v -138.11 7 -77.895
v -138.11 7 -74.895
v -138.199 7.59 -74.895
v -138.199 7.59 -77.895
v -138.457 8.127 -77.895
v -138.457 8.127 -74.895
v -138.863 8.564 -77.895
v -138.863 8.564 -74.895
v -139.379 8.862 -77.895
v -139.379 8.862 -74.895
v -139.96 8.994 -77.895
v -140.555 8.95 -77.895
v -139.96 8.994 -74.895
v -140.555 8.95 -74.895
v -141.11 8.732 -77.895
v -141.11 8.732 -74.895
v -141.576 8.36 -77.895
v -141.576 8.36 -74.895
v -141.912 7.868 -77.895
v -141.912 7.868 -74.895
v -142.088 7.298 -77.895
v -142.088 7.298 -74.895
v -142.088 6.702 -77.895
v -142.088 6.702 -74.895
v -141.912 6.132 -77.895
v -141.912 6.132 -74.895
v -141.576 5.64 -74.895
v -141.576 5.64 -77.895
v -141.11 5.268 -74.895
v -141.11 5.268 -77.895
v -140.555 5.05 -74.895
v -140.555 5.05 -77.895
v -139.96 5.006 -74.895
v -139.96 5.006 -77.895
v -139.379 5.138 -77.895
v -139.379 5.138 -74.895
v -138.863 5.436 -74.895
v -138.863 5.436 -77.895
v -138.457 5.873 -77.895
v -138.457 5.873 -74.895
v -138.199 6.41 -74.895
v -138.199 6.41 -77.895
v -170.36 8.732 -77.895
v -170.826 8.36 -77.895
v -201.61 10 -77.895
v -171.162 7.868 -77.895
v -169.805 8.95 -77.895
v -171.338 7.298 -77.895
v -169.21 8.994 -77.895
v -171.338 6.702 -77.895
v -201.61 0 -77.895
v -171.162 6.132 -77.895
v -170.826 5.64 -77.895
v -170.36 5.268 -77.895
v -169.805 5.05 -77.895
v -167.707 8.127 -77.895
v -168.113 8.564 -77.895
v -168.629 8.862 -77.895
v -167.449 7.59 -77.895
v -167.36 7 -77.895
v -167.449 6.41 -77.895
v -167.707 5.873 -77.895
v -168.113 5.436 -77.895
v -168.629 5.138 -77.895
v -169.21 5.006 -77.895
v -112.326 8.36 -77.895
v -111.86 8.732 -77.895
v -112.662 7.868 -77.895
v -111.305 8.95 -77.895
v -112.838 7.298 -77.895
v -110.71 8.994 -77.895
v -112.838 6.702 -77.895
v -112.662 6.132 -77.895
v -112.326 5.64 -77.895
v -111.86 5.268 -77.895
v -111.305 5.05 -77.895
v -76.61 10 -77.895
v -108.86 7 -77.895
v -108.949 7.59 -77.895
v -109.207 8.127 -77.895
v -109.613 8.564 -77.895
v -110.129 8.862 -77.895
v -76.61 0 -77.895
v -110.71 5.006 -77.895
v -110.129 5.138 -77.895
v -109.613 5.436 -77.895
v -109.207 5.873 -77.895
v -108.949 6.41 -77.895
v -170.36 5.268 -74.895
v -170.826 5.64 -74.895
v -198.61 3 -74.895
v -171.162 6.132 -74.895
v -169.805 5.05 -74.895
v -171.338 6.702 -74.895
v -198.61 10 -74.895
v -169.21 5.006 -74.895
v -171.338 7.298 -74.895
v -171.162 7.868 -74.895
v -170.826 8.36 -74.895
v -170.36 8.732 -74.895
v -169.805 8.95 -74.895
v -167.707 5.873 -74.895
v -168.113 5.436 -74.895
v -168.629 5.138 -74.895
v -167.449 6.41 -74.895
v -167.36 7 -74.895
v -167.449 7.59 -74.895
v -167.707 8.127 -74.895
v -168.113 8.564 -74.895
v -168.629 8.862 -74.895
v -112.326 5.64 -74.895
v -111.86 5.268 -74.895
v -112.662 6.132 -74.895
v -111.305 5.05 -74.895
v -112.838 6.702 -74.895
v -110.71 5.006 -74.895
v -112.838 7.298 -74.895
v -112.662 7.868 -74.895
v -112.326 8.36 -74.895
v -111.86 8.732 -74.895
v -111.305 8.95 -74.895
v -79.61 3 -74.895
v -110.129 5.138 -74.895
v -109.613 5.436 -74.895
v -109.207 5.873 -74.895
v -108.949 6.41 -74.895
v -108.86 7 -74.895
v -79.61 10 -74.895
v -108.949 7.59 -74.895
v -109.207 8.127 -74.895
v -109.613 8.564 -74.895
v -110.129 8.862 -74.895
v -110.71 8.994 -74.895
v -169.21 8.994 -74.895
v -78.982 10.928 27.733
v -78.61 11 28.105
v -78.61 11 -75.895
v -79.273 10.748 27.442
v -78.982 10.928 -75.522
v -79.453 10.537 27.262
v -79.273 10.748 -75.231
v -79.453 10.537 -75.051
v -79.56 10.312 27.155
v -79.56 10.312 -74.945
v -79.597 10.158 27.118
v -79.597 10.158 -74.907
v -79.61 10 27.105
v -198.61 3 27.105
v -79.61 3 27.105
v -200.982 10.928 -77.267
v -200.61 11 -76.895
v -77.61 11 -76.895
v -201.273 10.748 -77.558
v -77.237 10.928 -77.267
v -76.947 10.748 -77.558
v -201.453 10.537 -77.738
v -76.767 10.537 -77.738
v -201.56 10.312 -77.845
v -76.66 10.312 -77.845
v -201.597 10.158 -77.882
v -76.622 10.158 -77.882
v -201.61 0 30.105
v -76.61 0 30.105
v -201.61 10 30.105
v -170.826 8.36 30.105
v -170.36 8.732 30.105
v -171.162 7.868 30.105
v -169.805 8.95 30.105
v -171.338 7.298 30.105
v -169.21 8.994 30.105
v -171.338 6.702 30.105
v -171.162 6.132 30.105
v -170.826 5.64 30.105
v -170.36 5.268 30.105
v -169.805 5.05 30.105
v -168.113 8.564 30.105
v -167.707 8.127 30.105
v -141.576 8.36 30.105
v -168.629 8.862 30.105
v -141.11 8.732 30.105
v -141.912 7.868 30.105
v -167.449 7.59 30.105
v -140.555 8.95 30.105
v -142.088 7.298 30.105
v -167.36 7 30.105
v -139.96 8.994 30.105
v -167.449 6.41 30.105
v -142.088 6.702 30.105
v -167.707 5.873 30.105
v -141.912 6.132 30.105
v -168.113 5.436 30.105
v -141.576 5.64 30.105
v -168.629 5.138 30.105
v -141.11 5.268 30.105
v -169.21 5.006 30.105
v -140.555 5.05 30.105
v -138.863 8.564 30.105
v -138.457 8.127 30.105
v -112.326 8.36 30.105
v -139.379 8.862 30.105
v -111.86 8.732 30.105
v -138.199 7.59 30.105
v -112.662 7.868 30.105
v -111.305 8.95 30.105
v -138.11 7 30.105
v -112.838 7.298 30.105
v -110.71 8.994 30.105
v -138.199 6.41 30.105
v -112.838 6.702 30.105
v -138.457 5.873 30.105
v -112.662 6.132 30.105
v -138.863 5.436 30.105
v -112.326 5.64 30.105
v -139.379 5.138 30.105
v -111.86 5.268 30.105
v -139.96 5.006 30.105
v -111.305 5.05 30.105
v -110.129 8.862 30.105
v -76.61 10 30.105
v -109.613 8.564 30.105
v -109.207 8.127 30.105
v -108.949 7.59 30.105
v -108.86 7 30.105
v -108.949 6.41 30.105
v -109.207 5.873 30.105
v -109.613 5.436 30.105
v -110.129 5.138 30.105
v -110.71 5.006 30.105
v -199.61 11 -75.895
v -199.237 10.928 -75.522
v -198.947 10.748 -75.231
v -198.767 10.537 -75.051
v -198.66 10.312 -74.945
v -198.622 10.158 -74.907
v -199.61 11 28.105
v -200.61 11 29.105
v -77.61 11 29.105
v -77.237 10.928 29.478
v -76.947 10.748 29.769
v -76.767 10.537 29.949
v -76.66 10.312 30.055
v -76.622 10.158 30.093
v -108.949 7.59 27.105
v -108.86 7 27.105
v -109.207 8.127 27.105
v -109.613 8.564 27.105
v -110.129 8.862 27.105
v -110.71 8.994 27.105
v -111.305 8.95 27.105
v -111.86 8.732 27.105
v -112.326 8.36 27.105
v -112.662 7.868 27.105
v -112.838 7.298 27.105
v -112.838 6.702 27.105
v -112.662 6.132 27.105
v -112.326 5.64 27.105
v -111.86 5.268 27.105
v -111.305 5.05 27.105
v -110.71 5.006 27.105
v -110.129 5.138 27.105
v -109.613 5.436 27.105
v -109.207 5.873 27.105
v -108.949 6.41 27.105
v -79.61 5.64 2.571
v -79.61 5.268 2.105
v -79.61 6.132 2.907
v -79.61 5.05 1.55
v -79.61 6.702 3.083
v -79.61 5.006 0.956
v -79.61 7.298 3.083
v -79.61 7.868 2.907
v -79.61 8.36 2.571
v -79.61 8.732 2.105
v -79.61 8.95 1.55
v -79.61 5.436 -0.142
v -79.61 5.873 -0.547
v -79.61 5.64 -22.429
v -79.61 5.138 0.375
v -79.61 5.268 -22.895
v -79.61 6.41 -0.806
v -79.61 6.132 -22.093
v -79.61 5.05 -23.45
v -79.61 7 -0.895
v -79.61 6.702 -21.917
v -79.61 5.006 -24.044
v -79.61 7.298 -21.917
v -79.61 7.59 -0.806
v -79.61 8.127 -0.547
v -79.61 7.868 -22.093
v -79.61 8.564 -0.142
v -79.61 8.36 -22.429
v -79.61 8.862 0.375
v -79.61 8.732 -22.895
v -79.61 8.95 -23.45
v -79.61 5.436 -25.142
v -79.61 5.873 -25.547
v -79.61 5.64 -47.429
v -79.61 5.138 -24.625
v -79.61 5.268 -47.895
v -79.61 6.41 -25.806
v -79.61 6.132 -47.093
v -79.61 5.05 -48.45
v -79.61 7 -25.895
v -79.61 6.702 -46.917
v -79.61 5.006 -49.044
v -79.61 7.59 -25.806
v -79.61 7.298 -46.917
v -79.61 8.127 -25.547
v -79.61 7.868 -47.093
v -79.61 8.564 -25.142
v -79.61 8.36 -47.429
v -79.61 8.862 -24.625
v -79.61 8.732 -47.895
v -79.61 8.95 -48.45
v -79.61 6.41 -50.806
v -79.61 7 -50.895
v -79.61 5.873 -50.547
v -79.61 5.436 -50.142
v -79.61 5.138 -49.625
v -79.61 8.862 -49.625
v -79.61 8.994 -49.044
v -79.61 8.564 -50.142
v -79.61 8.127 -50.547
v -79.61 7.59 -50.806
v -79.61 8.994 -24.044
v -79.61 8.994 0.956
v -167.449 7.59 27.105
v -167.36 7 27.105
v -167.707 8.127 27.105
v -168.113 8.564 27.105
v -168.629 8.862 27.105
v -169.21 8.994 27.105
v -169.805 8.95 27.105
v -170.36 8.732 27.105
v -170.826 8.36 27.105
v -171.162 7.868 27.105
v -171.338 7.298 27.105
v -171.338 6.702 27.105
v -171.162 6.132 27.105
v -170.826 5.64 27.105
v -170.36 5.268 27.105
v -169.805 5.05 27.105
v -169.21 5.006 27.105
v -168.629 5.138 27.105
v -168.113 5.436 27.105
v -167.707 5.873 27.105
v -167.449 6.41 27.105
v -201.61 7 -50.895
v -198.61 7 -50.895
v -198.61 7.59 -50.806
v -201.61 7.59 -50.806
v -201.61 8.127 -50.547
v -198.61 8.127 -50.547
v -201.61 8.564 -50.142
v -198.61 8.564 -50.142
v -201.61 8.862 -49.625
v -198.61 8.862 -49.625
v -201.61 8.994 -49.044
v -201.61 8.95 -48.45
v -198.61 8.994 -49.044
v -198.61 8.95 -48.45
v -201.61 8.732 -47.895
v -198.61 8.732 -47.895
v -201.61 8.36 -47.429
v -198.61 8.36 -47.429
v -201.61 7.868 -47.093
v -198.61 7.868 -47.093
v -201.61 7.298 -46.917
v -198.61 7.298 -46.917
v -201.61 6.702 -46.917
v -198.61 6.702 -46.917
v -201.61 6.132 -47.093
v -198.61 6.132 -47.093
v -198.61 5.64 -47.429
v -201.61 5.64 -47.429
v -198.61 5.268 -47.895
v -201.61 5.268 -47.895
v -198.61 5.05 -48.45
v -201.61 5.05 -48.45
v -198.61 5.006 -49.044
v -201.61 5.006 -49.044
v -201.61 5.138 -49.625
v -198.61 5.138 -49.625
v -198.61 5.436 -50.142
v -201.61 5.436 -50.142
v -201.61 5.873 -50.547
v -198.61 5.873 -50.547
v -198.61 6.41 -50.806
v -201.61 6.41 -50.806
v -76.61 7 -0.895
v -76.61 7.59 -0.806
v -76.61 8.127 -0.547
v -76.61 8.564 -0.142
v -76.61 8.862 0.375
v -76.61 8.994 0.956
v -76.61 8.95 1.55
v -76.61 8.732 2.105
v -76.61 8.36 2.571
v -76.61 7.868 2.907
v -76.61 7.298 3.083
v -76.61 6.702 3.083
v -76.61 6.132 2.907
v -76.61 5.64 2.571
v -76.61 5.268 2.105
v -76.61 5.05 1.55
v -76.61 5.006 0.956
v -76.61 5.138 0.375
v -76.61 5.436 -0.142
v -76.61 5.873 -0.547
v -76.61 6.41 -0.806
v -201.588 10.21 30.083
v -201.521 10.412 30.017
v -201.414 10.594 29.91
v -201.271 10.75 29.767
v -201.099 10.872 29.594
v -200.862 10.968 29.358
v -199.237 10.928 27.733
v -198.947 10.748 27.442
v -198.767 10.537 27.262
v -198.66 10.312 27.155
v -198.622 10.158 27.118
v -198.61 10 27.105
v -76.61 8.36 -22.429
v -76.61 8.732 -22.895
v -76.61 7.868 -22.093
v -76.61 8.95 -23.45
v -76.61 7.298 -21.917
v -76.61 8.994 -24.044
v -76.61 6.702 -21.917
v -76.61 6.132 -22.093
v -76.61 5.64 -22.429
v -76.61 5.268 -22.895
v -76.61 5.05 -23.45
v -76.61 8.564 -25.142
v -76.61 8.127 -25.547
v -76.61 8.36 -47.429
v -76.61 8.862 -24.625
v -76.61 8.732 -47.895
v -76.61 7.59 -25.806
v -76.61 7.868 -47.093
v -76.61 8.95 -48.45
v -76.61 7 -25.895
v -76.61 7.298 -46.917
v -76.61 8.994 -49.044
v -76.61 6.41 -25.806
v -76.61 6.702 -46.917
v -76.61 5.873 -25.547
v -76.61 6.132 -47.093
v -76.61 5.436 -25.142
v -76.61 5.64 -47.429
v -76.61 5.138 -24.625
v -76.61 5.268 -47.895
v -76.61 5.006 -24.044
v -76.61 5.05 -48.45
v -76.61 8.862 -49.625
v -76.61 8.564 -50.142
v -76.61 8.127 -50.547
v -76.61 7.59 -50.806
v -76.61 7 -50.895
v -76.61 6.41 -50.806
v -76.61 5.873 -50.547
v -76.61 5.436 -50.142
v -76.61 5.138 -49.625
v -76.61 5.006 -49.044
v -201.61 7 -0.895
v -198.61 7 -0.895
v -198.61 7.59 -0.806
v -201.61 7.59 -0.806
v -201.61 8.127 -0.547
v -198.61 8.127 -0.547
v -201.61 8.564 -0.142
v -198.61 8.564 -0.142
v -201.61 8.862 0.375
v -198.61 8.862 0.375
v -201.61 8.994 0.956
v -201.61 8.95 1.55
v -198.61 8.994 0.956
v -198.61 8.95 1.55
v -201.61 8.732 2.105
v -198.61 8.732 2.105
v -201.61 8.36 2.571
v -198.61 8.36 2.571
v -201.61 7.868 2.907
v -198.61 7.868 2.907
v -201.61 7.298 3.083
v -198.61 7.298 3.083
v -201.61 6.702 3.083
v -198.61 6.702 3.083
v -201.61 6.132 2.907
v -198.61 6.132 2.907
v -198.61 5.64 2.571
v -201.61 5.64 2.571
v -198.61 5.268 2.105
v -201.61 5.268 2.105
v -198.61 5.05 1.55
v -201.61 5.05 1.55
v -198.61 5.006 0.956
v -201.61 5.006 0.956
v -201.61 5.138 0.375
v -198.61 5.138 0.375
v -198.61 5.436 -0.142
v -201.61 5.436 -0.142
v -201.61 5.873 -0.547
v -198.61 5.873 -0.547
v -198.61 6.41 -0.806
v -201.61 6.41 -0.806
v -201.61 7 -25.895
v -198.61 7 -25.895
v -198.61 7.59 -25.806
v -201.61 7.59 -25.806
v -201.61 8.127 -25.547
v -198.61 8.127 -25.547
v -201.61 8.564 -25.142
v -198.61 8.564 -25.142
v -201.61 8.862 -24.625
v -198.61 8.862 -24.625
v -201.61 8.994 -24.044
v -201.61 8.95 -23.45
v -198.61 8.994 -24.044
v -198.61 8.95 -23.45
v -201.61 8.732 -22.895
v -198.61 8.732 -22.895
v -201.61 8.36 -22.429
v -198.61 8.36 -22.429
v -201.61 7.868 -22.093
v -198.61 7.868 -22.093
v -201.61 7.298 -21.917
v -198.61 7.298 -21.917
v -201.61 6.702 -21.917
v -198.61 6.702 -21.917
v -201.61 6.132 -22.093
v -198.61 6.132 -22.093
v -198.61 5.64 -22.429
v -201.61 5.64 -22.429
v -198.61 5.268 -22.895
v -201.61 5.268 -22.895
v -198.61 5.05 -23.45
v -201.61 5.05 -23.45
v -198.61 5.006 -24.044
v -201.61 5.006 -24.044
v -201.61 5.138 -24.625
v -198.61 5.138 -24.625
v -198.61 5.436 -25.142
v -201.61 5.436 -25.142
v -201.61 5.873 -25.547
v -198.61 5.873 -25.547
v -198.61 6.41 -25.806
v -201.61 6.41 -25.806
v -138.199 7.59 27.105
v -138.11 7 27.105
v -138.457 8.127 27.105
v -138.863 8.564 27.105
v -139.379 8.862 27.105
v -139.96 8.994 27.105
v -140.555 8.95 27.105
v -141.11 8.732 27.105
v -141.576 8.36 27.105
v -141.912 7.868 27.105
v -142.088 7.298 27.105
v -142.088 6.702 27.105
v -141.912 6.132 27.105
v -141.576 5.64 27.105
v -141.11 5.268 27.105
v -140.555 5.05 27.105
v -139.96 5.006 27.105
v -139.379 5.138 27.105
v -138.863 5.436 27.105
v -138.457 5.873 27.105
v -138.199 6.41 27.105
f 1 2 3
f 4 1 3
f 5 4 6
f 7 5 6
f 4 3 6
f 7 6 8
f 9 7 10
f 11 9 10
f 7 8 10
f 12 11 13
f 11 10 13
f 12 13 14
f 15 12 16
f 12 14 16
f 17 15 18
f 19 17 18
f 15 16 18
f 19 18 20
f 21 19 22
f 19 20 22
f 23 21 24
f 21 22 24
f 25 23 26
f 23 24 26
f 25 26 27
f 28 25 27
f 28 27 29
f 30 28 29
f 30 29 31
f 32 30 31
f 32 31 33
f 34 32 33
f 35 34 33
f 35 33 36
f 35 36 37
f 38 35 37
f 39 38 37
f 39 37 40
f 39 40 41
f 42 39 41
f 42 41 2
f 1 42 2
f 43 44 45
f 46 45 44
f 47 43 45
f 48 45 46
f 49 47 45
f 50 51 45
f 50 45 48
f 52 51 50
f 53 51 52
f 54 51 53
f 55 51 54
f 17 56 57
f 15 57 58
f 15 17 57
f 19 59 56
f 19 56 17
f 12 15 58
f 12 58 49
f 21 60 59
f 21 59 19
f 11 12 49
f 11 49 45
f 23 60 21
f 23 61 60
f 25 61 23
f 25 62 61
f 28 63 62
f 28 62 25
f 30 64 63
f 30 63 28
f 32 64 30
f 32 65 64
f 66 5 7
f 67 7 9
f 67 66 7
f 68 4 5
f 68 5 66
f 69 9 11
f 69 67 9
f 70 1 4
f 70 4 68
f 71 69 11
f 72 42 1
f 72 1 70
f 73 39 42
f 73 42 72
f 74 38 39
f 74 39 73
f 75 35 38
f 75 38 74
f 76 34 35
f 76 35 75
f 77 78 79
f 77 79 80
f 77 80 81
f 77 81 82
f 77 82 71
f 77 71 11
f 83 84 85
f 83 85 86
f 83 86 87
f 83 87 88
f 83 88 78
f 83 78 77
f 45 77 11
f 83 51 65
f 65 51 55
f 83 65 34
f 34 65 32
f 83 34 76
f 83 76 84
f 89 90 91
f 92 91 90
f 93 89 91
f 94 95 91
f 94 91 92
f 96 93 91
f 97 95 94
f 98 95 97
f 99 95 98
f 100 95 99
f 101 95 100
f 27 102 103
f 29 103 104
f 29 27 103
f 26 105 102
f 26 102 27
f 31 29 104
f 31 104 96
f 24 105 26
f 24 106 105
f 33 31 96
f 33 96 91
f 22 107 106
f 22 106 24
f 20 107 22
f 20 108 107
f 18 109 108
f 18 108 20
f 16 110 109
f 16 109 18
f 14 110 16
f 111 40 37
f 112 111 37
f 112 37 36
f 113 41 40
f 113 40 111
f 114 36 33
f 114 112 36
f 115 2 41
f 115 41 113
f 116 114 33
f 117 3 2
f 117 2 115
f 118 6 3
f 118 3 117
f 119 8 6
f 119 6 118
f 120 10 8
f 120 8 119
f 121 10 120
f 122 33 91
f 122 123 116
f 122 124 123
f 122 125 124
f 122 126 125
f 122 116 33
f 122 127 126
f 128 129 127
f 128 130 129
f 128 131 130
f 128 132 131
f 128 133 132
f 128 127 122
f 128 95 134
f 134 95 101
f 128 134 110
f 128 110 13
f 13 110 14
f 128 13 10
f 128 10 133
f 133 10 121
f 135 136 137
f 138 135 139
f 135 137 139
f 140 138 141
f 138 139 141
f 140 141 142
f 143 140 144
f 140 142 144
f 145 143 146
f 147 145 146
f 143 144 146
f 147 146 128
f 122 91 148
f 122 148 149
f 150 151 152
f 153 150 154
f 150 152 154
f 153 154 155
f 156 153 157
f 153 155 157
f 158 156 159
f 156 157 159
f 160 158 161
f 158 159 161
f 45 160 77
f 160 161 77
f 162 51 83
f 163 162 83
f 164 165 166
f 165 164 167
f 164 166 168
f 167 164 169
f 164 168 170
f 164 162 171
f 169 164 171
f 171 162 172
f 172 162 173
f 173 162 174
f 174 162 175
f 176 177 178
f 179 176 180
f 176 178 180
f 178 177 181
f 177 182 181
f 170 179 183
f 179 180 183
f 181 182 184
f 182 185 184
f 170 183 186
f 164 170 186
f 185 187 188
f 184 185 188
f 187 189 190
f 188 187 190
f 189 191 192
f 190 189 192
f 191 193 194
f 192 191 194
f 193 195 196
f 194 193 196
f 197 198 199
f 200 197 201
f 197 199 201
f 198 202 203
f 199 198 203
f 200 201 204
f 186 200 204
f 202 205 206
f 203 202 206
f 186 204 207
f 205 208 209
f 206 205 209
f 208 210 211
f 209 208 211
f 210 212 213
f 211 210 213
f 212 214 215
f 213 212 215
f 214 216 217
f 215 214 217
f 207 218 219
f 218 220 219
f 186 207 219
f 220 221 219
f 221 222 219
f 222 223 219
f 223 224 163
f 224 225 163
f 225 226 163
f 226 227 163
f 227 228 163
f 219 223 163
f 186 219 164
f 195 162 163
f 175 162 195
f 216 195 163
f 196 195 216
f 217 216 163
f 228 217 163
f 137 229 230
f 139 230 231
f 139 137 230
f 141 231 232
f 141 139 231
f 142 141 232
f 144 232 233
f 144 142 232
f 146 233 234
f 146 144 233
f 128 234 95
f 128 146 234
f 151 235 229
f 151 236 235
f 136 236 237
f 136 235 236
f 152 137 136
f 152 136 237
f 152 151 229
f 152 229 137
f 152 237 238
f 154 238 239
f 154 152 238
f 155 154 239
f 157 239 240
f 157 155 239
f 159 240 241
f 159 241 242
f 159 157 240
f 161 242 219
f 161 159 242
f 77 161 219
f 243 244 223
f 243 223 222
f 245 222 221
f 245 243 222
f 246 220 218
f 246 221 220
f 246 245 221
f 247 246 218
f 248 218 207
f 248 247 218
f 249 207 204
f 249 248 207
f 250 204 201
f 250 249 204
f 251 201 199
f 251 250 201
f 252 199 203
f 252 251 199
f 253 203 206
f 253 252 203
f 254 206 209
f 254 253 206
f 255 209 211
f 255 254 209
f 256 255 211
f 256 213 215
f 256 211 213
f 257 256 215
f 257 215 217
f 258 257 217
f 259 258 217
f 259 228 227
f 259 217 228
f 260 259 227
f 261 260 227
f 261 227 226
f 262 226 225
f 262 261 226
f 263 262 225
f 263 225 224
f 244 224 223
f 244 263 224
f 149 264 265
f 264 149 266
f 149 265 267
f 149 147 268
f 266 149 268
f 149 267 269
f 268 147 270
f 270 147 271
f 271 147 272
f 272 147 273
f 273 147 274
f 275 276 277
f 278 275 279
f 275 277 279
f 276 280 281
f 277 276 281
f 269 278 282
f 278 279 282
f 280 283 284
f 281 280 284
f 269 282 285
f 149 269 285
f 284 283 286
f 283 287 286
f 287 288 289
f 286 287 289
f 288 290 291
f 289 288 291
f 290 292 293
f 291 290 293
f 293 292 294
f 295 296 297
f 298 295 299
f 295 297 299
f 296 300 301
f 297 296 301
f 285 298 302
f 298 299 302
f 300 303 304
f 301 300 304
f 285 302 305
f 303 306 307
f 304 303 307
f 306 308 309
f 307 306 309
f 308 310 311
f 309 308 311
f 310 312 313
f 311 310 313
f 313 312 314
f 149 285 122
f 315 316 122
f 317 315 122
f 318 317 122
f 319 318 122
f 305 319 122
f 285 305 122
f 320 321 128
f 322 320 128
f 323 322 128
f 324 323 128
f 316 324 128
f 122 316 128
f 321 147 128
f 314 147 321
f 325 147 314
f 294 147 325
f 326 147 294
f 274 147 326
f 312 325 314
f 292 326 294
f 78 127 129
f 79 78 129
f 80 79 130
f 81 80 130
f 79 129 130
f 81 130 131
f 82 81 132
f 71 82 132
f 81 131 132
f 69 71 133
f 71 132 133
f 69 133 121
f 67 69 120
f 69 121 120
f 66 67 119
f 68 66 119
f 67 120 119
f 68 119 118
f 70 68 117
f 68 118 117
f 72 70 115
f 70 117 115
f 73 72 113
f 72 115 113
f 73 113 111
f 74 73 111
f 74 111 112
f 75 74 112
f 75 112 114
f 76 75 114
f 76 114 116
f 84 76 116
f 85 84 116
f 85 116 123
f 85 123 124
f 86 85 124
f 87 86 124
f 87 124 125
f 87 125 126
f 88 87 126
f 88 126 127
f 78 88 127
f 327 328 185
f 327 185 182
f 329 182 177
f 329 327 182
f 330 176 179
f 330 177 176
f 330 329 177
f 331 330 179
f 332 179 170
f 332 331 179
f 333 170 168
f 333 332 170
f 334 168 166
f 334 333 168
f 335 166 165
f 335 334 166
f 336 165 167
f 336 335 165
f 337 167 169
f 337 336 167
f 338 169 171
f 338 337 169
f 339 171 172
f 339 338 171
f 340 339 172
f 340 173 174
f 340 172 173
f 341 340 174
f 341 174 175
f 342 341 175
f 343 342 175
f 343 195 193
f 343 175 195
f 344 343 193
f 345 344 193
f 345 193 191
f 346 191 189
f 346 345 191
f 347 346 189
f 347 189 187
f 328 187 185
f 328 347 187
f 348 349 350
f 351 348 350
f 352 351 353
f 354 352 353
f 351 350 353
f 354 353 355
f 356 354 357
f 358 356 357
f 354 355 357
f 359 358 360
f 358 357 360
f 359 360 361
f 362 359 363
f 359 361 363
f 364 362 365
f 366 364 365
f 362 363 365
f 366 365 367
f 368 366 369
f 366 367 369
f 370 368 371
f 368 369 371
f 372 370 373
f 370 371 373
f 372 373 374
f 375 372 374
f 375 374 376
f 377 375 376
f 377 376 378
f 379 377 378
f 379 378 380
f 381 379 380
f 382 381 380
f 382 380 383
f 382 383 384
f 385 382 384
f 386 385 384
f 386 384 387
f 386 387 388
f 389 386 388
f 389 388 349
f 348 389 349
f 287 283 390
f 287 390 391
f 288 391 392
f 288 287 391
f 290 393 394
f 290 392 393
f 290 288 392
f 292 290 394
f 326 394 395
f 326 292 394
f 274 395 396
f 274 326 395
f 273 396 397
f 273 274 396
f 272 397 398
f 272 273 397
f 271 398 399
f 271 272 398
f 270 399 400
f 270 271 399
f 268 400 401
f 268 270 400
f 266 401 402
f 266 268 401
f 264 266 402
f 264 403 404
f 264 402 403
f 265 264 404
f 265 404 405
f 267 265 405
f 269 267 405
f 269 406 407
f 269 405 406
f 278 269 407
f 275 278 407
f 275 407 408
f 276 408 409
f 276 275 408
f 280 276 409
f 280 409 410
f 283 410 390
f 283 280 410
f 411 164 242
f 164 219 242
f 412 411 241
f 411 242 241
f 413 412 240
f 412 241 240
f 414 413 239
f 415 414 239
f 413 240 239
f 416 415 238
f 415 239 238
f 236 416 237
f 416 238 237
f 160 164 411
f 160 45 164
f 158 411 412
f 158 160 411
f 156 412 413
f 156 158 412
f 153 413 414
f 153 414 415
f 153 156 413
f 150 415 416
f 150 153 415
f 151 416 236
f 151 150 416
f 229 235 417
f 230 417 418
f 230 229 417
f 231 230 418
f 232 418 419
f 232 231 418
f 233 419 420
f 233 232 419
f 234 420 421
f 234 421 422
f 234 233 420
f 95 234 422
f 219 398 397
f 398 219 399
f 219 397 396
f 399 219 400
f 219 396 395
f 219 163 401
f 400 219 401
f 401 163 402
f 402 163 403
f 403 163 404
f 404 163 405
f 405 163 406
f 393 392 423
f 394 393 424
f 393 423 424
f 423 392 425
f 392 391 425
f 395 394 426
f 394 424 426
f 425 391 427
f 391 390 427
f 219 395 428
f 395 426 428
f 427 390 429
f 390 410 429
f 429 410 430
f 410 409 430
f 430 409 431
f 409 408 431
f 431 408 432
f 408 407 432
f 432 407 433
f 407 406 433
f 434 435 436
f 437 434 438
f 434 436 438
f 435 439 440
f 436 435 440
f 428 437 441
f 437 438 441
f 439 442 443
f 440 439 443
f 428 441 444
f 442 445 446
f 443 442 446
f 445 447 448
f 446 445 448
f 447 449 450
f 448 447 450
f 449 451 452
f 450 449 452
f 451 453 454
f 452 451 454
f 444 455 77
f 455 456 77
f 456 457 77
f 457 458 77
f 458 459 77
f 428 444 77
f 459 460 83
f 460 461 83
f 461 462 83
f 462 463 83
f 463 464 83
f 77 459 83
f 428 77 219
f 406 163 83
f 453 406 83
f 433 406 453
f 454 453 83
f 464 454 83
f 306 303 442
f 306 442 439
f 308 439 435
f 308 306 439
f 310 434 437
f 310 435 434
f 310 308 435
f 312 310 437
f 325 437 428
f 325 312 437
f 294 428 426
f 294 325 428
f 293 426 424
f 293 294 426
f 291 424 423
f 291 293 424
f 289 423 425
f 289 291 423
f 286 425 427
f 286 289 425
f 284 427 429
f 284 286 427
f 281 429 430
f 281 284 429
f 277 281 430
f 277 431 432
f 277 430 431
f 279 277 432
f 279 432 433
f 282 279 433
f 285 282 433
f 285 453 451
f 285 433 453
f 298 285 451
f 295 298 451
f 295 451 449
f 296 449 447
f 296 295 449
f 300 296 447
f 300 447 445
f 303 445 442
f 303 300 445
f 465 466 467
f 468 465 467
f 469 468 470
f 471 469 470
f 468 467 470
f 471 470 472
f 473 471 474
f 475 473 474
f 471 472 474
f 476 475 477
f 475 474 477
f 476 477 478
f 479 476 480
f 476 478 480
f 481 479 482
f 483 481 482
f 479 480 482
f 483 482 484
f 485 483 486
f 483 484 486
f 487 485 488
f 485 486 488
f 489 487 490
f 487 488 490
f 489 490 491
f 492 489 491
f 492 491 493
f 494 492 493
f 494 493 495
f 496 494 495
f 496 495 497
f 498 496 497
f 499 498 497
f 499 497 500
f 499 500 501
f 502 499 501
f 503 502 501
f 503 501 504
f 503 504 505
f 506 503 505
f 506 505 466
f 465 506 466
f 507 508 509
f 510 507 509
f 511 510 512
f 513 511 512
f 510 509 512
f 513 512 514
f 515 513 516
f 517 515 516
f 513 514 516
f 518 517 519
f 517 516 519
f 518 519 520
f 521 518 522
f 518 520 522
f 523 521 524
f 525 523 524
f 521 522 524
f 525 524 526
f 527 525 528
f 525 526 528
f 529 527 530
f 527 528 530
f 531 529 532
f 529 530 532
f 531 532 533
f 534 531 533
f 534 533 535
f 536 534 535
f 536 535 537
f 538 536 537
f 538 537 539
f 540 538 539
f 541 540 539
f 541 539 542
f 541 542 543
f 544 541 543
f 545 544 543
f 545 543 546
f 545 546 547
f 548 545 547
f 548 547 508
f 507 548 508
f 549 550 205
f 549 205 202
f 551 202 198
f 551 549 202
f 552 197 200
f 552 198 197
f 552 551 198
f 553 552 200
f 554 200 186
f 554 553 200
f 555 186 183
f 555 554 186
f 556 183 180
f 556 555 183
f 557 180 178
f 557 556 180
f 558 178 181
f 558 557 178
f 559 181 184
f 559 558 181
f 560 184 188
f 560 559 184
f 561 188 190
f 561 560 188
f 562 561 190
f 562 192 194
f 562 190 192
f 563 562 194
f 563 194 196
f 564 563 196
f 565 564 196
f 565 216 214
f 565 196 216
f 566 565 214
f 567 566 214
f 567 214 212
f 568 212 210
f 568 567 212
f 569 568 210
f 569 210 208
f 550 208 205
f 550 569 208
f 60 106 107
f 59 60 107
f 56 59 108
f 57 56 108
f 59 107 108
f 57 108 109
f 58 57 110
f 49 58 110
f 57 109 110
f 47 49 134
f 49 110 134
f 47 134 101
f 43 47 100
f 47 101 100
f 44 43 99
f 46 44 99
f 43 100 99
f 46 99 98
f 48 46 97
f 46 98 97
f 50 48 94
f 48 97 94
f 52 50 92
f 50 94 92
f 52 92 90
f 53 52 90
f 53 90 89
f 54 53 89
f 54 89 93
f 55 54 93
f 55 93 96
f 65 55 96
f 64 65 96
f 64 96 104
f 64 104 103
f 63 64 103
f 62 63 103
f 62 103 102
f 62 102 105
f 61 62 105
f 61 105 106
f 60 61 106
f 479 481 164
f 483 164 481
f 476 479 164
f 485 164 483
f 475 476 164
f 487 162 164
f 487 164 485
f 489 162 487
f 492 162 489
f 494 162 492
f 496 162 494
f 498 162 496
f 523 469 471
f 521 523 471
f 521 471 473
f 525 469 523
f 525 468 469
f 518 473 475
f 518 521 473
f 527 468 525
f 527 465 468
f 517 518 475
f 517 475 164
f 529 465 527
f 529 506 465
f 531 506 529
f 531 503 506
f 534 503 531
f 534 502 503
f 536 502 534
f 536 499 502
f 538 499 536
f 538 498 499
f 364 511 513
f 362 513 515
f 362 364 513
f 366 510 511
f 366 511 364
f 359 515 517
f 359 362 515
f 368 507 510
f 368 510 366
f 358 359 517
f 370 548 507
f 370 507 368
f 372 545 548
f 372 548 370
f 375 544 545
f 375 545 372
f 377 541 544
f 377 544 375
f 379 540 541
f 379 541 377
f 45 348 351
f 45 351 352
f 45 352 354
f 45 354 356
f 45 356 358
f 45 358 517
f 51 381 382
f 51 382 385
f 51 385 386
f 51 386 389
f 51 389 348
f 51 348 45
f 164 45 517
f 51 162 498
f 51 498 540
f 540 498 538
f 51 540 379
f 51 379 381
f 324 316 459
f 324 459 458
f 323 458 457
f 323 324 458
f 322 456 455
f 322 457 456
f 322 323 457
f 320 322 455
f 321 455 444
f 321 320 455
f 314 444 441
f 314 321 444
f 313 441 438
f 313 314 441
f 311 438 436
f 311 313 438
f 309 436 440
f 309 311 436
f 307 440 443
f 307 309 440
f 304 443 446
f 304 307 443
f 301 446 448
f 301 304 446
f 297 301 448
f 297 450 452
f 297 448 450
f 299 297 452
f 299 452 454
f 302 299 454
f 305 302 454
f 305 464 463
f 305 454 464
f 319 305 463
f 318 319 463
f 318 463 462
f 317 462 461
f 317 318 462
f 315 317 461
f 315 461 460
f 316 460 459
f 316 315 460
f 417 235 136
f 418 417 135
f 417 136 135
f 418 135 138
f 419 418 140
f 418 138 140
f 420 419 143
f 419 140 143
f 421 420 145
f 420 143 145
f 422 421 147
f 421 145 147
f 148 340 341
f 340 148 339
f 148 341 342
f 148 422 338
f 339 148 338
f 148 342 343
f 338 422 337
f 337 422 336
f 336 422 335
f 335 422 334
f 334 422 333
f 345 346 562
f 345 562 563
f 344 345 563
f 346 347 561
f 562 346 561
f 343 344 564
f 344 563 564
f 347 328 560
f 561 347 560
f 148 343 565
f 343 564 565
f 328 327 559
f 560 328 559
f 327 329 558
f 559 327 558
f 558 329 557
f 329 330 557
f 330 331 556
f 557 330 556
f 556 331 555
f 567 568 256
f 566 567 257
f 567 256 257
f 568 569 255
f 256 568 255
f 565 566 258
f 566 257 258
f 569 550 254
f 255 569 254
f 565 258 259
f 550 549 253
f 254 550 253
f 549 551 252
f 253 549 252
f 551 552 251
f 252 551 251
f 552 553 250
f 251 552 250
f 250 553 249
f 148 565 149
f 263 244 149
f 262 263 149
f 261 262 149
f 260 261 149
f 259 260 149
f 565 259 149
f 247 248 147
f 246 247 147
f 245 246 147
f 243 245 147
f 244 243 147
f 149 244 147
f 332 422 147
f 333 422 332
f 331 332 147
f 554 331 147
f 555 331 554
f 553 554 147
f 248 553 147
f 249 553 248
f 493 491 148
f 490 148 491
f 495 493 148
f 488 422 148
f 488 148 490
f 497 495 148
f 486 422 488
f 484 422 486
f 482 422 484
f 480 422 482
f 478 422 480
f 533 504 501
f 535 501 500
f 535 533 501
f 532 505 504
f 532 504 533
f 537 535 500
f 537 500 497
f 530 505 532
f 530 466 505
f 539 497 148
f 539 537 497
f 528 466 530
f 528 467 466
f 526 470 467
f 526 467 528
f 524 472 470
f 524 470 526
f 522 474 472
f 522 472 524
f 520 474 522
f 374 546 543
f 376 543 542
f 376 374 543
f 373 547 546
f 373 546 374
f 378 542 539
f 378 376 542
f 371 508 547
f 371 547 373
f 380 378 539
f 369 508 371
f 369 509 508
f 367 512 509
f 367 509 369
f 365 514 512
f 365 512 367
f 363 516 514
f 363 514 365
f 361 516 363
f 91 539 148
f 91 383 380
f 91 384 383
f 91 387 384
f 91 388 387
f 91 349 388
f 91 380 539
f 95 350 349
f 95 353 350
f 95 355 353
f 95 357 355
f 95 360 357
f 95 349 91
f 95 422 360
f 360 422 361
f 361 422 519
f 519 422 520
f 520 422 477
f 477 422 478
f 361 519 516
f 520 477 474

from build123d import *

# Parameters (mm, degrees)
SKETCH1_W               = 125
SKETCH1_H               = 108
BOSS_EXTRUDE1_DEPTH     = 11
SKETCH4_W               = 119
SKETCH4_H               = 102
CUT_EXTRUDE1_DEPTH      = 8
SKETCH6_R               = 2
CUT_EXTRUDE6_DEPTH      = 123
CUT_EXTRUDE6_DEPTH_BACK = 4
SKETCH5_R               = 2
CUT_EXTRUDE5_DEPTH      = 106
CUT_EXTRUDE5_DEPTH_BACK = 4
FILLET2_R               = 1


with BuildPart() as part:
    # Sketch1 → Boss-Extrude1 (new body)
    with BuildSketch(Plane(origin=(0, 0, 0), x_dir=(1, 0, 0), z_dir=(0, 1, 0))):
        with Locations((-139.109907121, 23.894736842)):
            Rectangle(SKETCH1_W, SKETCH1_H)
    extrude(amount=BOSS_EXTRUDE1_DEPTH)

    # Sketch4 → Cut-Extrude1 (cut)
    with BuildSketch(Plane(origin=(0, 11, 0), x_dir=(1, 0, 0), z_dir=(0, 1, 0))):
        with Locations((-139.109907121, 23.894736842)):
            Rectangle(SKETCH4_W, SKETCH4_H)
    extrude(amount=-CUT_EXTRUDE1_DEPTH, mode=Mode.SUBTRACT)

    # Sketch6 → Cut-Extrude6 (cut, two sides)
    with BuildSketch(Plane(origin=(-198.609907121, 0, 0), x_dir=(0, 0, -1), z_dir=(1, 0, 0))) as cut_extrude6_sk:
        with Locations((-1.105263158, 6.999999953)):
            Circle(SKETCH6_R)
        with Locations((23.894736842, 6.999999977)):
            Circle(SKETCH6_R)
        with Locations((48.894736842, 7)):
            Circle(SKETCH6_R)
    extrude(amount=CUT_EXTRUDE6_DEPTH, mode=Mode.SUBTRACT)
    extrude(cut_extrude6_sk.sketch, amount=-CUT_EXTRUDE6_DEPTH_BACK, mode=Mode.SUBTRACT)

    # Sketch5 → Cut-Extrude5 (cut, two sides)
    with BuildSketch(Plane.XY.offset(-74.894736842)) as cut_extrude5_sk:
        with Locations((-169.359907121, 7)):
            Circle(SKETCH5_R)
        with Locations((-140.109907121, 7)):
            Circle(SKETCH5_R)
        with Locations((-110.859907121, 7)):
            Circle(SKETCH5_R)
    extrude(amount=CUT_EXTRUDE5_DEPTH, mode=Mode.SUBTRACT)
    extrude(cut_extrude5_sk.sketch, amount=-CUT_EXTRUDE5_DEPTH_BACK, mode=Mode.SUBTRACT)

    # Fillet2
    fillet2_edges = [part.edges().sort_by_distance(p)[0] for p in [
        (-76.609907121, 11, -23.894736842),
        (-139.109907121, 11, -77.894736842),
        (-198.609907121, 11, -23.894736842),
        (-139.109907121, 11, 27.105263158),
        (-79.609907121, 11, -23.894736842),
        (-139.109907121, 11, -74.894736842),
        (-201.609907121, 11, -23.894736842),
        (-139.109907121, 11, 30.105263158),
    ]]
    fillet(fillet2_edges, radius=FILLET2_R)


solid = part.part
